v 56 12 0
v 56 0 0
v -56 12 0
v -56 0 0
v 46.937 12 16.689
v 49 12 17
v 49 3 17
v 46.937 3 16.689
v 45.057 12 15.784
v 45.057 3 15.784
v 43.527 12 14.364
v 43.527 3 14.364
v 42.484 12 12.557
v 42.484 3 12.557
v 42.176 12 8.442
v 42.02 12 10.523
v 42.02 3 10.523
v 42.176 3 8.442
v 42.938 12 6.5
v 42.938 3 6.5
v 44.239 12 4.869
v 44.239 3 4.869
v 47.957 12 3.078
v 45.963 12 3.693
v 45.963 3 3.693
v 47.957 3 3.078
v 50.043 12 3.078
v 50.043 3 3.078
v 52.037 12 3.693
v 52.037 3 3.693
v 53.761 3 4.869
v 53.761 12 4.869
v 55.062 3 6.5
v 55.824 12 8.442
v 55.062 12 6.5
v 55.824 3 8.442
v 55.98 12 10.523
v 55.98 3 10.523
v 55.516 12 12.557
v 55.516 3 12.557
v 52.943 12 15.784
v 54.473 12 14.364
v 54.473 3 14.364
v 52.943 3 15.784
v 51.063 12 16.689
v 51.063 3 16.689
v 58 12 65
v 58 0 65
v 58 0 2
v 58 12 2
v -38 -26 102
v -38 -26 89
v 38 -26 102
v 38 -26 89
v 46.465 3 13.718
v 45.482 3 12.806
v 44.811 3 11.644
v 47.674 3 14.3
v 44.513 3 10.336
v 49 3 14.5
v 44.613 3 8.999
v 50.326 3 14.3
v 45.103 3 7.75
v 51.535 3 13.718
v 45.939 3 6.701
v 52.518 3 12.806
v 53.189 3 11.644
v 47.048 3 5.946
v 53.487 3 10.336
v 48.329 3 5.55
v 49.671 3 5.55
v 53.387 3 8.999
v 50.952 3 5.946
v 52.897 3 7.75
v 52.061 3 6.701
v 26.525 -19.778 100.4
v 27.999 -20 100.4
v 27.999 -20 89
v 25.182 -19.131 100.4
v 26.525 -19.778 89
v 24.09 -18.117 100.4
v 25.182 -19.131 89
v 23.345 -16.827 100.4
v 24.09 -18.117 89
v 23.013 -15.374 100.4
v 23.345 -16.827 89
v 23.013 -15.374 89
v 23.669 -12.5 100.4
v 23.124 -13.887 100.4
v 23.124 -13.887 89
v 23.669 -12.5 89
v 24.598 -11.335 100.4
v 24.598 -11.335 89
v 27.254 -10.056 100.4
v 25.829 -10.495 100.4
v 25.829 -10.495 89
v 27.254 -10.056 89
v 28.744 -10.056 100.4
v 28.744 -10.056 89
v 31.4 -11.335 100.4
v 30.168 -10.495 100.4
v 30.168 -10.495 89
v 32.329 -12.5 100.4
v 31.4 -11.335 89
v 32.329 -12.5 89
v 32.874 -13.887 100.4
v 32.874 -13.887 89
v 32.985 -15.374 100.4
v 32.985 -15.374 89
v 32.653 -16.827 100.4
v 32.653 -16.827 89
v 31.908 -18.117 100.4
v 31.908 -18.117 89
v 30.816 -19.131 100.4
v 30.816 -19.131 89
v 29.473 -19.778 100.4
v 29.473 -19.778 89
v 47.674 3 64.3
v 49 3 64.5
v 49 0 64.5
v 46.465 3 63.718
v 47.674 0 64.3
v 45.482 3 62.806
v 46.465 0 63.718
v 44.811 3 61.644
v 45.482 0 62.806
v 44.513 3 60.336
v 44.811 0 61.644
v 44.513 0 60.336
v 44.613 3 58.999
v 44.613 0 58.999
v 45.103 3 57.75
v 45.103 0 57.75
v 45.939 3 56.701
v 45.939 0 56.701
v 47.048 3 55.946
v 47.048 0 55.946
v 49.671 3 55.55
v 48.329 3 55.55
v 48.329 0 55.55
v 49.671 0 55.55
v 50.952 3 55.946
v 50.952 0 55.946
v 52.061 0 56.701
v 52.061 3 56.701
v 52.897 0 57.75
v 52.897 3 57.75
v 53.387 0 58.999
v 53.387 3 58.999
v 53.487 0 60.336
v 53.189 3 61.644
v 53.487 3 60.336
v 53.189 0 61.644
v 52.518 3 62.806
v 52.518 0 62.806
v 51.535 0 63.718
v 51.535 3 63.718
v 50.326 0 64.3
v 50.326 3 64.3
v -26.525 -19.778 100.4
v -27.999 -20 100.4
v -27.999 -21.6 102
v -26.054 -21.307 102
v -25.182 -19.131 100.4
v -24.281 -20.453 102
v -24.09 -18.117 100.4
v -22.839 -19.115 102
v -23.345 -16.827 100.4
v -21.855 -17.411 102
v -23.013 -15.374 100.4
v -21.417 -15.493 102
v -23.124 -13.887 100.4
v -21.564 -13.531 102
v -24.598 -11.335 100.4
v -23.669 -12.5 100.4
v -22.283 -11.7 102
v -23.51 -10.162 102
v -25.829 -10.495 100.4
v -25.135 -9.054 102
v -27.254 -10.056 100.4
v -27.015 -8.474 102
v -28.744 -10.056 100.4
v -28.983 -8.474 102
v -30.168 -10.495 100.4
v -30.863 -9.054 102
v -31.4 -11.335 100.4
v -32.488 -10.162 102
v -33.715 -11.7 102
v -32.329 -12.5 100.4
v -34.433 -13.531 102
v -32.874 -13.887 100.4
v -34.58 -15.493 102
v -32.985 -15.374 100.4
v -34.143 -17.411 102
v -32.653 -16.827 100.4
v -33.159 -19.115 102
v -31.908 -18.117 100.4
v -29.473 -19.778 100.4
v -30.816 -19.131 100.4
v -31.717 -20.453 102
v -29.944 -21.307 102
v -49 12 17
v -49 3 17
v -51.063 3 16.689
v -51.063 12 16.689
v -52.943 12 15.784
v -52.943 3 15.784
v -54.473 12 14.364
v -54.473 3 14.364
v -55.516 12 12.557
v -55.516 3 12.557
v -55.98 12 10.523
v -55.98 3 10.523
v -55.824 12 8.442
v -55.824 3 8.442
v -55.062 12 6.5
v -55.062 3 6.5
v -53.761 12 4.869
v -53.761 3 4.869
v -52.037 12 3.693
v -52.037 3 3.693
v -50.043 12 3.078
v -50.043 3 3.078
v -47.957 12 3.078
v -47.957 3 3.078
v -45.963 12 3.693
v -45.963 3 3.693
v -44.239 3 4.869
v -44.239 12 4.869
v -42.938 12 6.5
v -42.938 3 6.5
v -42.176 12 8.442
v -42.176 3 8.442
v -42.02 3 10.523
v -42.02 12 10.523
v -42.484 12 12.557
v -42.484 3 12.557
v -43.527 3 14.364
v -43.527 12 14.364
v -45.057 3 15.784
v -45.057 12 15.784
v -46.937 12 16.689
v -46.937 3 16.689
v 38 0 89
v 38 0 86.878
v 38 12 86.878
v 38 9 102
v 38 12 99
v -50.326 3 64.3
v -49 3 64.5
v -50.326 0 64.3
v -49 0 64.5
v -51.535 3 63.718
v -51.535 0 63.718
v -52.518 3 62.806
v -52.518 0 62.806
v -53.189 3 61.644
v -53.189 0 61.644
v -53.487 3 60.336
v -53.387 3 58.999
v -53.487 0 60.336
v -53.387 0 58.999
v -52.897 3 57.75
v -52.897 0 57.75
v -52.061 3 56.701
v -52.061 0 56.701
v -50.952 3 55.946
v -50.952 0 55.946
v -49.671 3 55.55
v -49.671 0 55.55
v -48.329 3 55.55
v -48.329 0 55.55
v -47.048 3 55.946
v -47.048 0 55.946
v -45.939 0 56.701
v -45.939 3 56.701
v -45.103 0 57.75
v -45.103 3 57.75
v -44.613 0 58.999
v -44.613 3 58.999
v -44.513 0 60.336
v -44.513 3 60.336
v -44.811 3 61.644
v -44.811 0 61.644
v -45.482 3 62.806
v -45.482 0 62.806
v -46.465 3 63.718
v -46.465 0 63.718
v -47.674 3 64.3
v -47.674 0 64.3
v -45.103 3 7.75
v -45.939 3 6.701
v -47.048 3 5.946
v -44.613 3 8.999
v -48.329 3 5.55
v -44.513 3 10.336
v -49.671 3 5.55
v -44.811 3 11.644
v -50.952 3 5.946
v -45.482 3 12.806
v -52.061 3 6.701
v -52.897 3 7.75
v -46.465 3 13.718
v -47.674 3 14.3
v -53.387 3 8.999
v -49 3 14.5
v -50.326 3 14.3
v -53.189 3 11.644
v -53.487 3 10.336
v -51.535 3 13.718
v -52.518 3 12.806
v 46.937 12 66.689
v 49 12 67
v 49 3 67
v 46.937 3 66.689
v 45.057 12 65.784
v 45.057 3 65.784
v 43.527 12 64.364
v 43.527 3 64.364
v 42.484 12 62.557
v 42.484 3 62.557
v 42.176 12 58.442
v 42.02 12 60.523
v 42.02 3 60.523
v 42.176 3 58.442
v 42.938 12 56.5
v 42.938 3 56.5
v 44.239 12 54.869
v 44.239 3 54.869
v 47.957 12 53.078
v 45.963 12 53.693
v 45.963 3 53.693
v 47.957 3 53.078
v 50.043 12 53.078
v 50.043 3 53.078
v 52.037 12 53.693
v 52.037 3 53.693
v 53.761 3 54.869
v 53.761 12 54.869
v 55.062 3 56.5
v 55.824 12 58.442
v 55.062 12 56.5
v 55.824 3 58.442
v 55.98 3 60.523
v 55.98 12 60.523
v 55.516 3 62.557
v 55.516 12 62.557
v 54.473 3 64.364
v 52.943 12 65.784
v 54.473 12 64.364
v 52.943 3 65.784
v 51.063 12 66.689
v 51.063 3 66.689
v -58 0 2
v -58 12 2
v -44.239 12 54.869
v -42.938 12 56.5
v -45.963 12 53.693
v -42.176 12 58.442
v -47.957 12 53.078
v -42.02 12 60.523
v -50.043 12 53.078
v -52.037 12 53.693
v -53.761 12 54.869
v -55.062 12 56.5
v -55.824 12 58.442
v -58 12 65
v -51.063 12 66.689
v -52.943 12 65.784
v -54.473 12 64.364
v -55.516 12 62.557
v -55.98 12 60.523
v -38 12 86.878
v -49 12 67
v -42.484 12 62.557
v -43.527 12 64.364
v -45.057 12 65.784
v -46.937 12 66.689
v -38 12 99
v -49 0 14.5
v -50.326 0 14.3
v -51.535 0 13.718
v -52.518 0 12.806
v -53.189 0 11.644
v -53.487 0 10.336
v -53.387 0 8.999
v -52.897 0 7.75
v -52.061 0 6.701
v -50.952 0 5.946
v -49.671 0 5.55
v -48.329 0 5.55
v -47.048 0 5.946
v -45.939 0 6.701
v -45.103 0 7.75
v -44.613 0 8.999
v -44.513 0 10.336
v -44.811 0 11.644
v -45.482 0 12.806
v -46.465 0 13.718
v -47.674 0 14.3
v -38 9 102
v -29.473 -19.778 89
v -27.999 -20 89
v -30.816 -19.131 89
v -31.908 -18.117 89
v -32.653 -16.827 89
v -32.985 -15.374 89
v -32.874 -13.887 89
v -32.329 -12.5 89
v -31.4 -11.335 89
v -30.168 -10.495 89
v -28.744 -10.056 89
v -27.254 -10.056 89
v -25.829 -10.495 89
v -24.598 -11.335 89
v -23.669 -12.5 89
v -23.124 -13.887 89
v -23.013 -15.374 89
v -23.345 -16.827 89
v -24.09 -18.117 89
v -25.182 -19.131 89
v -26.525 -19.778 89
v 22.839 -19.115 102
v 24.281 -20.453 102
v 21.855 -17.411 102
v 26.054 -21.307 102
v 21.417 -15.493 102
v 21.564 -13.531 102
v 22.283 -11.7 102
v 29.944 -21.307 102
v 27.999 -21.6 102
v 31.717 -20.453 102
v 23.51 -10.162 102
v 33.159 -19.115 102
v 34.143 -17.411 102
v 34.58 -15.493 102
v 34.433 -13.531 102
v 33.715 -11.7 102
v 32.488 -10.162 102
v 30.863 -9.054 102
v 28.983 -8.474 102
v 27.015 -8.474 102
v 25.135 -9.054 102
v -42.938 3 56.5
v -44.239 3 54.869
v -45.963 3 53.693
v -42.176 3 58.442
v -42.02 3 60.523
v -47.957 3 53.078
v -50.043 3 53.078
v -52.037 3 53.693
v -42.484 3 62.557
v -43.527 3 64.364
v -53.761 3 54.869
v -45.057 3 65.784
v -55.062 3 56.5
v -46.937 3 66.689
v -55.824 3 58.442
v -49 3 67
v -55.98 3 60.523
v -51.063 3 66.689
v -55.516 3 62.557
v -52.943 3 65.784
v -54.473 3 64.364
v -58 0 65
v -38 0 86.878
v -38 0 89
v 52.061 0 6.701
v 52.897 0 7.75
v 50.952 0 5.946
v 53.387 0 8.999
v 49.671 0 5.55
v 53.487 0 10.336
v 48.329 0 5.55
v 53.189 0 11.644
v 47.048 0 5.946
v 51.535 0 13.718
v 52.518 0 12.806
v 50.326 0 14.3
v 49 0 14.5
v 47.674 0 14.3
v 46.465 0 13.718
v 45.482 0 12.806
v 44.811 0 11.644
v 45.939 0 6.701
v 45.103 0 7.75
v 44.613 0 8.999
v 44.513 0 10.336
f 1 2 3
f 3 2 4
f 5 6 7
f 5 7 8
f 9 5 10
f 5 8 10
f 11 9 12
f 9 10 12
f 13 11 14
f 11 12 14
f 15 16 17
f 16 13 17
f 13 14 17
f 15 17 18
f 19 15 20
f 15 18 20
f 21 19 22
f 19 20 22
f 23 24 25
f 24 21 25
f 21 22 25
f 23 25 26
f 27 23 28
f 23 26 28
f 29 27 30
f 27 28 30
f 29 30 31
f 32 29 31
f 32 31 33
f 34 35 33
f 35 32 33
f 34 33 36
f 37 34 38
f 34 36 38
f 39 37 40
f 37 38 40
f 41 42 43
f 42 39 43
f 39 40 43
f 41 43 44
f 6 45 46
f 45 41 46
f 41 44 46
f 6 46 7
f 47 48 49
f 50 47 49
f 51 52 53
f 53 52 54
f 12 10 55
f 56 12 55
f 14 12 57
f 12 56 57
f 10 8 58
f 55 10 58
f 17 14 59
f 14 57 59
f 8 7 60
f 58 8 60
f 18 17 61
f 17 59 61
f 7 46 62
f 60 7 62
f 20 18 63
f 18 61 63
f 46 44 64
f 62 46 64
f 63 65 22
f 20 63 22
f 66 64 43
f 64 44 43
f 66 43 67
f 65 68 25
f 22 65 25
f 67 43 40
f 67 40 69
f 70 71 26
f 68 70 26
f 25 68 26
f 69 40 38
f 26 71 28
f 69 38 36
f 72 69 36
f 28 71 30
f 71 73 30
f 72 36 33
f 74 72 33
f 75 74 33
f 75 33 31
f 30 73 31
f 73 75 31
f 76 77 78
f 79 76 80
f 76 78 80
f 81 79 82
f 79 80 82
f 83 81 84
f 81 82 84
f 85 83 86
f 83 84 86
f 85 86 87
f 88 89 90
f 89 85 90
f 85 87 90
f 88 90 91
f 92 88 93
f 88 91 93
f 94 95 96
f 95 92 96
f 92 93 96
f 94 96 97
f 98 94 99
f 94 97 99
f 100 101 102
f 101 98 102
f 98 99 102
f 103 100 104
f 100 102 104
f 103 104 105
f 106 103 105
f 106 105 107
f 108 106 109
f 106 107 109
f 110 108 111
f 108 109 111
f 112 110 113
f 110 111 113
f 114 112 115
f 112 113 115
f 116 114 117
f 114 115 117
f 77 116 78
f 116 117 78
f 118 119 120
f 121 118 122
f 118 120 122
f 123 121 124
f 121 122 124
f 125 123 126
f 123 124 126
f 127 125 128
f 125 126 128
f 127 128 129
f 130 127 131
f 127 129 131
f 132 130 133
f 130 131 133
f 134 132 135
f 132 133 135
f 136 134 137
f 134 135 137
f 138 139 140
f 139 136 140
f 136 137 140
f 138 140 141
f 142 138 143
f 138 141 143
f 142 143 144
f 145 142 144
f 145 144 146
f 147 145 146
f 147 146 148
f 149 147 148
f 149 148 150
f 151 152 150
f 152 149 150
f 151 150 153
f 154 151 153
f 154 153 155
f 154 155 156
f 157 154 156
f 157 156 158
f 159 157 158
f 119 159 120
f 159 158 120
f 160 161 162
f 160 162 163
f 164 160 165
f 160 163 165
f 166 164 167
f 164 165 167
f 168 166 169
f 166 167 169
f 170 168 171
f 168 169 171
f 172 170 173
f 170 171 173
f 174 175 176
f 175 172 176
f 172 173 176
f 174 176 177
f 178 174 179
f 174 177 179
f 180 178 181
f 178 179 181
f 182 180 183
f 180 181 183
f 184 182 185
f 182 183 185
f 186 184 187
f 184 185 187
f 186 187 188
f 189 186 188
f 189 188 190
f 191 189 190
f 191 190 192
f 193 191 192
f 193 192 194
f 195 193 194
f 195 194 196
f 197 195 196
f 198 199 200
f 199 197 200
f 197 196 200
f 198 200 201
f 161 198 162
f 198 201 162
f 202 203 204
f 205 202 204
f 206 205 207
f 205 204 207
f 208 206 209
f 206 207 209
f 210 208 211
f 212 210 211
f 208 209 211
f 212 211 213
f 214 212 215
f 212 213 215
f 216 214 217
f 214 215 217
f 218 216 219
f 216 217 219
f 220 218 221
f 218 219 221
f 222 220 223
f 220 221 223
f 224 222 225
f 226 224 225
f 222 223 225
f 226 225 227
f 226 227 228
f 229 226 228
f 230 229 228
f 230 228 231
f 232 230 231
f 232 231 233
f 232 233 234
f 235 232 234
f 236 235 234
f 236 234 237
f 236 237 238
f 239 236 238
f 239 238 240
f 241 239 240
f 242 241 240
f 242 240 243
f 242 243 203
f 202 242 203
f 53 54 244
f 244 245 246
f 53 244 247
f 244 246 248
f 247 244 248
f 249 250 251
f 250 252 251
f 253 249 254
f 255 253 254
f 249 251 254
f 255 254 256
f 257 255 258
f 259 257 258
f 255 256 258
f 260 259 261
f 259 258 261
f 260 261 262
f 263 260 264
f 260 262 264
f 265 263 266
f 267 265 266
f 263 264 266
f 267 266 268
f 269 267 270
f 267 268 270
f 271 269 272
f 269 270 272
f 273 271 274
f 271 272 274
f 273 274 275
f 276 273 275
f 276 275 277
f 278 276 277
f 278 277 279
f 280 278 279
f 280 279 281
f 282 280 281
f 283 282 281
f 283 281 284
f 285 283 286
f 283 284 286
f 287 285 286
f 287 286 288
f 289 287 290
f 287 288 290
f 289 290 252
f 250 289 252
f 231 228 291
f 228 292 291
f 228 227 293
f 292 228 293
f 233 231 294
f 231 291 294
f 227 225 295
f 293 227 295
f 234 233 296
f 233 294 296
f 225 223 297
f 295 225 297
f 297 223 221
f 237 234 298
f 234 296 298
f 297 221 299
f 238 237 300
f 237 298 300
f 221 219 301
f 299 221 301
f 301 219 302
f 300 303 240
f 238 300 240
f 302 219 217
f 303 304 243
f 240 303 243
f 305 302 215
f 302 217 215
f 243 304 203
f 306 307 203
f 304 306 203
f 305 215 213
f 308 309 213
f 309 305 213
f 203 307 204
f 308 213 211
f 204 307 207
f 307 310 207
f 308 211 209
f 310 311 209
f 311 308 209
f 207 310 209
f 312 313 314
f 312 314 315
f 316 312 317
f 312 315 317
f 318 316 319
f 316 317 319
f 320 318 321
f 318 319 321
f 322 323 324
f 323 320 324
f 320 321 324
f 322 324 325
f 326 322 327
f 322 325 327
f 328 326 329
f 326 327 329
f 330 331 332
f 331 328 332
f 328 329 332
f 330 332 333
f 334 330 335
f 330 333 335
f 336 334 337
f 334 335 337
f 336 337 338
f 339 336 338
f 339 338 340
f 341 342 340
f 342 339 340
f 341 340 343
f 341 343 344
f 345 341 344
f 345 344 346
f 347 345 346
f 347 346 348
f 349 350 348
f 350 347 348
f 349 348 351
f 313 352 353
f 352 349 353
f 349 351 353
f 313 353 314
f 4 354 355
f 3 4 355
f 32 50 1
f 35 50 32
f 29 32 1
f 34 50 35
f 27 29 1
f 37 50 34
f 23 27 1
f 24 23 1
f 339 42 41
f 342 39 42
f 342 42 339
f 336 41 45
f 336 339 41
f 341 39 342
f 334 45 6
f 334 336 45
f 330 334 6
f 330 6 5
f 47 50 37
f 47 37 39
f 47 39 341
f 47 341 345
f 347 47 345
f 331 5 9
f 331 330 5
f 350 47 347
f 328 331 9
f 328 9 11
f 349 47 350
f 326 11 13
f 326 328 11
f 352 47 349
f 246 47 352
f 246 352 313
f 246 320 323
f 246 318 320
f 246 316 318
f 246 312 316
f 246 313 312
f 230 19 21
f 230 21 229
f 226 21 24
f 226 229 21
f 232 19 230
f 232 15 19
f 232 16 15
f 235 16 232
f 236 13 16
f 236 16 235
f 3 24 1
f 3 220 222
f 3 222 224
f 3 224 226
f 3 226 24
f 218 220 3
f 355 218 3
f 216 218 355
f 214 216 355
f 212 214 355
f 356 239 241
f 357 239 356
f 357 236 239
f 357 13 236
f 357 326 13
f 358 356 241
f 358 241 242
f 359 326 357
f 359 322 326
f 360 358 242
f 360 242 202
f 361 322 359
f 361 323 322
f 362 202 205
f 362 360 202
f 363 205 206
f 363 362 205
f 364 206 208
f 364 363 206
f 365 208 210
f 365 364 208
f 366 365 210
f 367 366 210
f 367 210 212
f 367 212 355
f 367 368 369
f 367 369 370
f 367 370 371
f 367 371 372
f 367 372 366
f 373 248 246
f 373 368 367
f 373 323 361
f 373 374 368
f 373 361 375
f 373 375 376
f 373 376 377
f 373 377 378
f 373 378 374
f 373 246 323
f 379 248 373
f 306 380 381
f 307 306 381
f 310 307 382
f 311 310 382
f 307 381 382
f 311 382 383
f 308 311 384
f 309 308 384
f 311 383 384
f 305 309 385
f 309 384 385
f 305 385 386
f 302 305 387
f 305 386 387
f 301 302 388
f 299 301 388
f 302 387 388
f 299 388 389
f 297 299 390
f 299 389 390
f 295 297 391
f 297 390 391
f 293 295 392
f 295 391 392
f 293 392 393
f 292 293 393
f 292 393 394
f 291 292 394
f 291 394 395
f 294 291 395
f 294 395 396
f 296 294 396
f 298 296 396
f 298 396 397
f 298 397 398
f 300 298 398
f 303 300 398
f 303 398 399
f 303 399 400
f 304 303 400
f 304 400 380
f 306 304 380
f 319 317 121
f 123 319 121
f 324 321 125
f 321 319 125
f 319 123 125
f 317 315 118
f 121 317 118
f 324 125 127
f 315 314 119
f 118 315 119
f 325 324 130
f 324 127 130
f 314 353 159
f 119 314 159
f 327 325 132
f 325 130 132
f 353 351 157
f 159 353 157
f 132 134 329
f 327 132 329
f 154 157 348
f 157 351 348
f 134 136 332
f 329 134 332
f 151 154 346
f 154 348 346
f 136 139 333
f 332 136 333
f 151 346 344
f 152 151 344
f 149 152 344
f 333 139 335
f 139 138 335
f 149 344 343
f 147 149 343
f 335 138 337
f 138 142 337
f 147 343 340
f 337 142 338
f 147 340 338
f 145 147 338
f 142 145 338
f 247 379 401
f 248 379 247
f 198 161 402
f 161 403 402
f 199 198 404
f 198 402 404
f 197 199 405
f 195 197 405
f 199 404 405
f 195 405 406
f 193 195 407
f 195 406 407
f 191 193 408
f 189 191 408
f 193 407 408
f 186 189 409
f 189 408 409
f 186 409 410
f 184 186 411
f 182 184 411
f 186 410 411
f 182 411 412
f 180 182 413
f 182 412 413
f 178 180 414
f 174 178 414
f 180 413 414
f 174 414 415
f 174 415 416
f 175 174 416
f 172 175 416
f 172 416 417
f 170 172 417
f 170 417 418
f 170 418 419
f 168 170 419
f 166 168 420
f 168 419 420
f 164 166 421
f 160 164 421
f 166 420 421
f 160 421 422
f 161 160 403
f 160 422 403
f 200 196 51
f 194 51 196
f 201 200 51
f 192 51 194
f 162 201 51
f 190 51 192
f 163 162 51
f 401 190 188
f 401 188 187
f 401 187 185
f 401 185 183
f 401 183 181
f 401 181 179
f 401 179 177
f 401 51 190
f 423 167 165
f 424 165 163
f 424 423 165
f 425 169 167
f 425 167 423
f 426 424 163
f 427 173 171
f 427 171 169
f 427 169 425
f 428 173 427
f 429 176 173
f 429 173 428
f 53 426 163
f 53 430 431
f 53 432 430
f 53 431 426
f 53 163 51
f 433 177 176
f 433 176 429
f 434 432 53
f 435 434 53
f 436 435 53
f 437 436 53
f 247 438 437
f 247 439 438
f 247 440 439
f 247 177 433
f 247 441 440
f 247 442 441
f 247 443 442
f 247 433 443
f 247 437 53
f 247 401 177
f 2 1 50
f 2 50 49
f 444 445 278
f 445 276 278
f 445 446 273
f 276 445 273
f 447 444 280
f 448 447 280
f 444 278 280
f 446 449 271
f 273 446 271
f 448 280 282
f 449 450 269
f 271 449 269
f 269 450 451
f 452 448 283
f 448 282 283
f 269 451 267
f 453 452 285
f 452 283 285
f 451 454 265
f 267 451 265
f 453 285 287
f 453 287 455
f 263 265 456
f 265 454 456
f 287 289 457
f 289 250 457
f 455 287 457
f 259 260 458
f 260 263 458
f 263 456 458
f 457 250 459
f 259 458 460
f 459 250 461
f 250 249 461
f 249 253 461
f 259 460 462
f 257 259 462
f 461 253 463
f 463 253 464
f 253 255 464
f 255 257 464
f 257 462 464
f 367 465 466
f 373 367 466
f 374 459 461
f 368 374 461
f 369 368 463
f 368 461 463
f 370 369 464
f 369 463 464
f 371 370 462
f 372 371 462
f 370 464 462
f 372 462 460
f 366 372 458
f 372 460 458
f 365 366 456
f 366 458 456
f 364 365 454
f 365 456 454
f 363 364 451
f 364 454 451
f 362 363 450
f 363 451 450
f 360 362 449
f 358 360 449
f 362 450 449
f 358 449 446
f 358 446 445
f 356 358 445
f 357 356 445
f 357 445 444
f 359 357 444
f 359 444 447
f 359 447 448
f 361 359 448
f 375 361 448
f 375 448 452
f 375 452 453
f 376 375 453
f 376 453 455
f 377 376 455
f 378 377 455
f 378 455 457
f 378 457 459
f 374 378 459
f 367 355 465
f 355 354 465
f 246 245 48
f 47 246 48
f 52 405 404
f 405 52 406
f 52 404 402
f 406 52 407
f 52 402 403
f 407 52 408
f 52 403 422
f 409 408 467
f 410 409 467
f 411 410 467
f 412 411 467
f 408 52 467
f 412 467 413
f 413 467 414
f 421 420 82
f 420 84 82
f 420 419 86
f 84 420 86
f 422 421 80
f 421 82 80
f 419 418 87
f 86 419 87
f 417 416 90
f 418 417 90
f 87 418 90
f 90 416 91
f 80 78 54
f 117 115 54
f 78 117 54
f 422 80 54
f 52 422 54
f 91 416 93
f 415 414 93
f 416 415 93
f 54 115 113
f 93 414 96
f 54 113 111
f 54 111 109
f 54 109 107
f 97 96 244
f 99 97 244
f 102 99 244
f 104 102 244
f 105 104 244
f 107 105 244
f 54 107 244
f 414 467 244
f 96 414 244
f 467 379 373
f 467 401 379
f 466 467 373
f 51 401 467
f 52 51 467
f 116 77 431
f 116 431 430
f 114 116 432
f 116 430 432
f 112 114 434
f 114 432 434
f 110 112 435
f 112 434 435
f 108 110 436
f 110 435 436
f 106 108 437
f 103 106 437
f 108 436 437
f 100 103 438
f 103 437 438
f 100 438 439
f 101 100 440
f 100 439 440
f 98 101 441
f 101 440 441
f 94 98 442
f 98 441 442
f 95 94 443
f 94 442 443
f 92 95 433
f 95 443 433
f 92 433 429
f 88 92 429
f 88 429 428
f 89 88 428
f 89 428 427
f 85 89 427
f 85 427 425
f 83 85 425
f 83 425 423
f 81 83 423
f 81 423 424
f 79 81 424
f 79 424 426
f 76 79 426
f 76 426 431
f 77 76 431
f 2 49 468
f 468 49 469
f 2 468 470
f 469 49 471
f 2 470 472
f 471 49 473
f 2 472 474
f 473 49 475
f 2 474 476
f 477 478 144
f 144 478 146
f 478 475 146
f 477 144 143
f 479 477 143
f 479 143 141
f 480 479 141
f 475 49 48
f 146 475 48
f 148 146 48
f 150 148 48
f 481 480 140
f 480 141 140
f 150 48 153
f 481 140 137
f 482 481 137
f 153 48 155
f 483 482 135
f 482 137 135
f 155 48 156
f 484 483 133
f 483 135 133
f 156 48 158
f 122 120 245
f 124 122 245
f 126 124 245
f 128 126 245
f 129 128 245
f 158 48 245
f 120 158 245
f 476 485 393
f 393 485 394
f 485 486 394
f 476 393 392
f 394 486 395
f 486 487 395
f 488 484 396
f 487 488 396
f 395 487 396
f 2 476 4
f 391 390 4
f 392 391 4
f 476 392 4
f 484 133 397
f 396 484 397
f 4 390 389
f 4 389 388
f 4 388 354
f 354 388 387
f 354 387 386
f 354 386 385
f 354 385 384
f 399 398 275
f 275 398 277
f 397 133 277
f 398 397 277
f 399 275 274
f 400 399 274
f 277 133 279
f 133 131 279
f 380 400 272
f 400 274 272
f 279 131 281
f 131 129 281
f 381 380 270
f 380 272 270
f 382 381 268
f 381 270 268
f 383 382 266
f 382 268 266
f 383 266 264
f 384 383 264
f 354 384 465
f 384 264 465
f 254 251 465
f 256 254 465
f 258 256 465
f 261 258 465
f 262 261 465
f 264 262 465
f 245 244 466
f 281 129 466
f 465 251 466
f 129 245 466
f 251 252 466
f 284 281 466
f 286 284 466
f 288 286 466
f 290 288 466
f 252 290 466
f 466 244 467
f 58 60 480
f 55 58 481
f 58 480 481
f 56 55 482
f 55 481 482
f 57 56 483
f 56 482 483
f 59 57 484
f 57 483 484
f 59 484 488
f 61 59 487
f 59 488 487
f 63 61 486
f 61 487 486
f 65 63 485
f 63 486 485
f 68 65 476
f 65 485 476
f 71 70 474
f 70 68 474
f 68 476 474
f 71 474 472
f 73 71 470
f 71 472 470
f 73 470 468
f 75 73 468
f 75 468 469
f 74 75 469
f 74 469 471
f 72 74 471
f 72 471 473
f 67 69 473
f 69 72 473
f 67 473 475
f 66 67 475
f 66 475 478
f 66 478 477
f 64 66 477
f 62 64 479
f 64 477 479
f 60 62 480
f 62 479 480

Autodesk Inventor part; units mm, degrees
ref_plane "YZ Plane" through (0, 0, 0) normal (1, 0, 0) x (0, 1, 0)
ref_plane "XZ Plane" through (0, 0, 0) normal (0, 1, 0) x (-1, 0, 0)
ref_plane "XY Plane" through (0, 0, 0) normal (0, 0, 1) x (1, 0, 0)
sketch "Эскиз1" plane through (0, 0, 0) normal (0, 1, 0) x (-1, 0, 0)
  line L0 (0, 0) -> (58, 0)
  line L1 (58, 0) -> (58, 65)
  line L2 (58, 65) -> (38, 86.8785)
  line L3 (0, 0) -> (0, 102)
  line L4 (0, 102) -> (38, 102)
  line L5 (38, 102) -> (38, 86.8785)
  line L6 (0, 0) -> (49, 0)
  line L7 (49, 0) -> (49, 10)
  line L8 (49, 10) -> (49, 60)
  dimension "d8" = 58
  dimension "d9" = 65
  dimension "d10" = 102
  dimension "d11" = 38
  dimension "d12" = 49
  dimension "d13" = 10
  dimension "d14" = 50
extrude "Выдавливание1" add sketch "Эскиз1" along normal blind 12
sketch "Эскиз3" plane through (0, 12, 0) normal (0, 1, 0) x (1, 0, 0)
  line L0 (-38, -102) -> (0, -102) projected
  line L1 (-38, -102) -> (-38, -89)
  line L2 (-38, -86.8785) -> (-38, -102) projected
  line L3 (-38, -89) -> (0, -89)
  line L4 (0, -89) -> (0, -102)
  point P0 (0, 0)
  dimension "d17" = 13
extrude "Выдавливание2" add sketch "Эскиз3" against normal blind 38
sketch "Эскиз4" plane through (0, 12, 0) normal (0, 1, 0) x (1, 0, 0)
  line L0 (0, 0) -> (-58, 0) projected
  line L1 (0, 0) -> (-49, 0)
  line L2 (-49, 0) -> (-49, -10)
  line L3 (-49, -10) -> (-49, -60)
  dimension "d20" = 49
  dimension "d21" = 10
  dimension "d22" = 50
hole "Отверстие1" at (-49, 12, 60) at (-49, 12, 10) direction (0, -1, 0) diameter 9 end through all counterbore diameter 14 counterbore depth 9
sketch "Эскиз6" plane through (-38, 12, 102) normal (0, 0, 1) x (1, 0, 0)
  line L0 (38, -37.7549) -> (10.0011, -38)
  line L1 (0, -38) -> (38, -38) projected
  line L2 (10.0011, -38) -> (10.0011, -27)
  point P0 (38, -12)
  dimension "d39" = 28
  dimension "d40" = 11
hole "Отверстие3" at (-27.9989, -15, 102) direction (0, 0, -1) diameter 10 end through all
mirror "Зеркальное отражение1" about plane through (0, 0, 102) normal (1, 0, 0) of "Выдавливание2", "Выдавливание1", "Отверстие1", "Отверстие3"
thread "Резьба1" size "M10x1.5" class "6H" standard "ANSI Metric M Profile" full length
thread "Резьба2" size "M10x1.5" class "6H" standard "ANSI Metric M Profile" full length
chamfer "Фаска1" distance 1.6 angle 45 2 edges at (27.9989, -10, 102) (-27.9989, -10, 102)
chamfer "Фаска2" distance 3 angle 45 1 edges at (0, 12, 102)
chamfer "Фаска3" distance 2 angle 45 2 edges at (58, 6, 0) (-58, 6, 0)
properties part number "Крышка-6"
